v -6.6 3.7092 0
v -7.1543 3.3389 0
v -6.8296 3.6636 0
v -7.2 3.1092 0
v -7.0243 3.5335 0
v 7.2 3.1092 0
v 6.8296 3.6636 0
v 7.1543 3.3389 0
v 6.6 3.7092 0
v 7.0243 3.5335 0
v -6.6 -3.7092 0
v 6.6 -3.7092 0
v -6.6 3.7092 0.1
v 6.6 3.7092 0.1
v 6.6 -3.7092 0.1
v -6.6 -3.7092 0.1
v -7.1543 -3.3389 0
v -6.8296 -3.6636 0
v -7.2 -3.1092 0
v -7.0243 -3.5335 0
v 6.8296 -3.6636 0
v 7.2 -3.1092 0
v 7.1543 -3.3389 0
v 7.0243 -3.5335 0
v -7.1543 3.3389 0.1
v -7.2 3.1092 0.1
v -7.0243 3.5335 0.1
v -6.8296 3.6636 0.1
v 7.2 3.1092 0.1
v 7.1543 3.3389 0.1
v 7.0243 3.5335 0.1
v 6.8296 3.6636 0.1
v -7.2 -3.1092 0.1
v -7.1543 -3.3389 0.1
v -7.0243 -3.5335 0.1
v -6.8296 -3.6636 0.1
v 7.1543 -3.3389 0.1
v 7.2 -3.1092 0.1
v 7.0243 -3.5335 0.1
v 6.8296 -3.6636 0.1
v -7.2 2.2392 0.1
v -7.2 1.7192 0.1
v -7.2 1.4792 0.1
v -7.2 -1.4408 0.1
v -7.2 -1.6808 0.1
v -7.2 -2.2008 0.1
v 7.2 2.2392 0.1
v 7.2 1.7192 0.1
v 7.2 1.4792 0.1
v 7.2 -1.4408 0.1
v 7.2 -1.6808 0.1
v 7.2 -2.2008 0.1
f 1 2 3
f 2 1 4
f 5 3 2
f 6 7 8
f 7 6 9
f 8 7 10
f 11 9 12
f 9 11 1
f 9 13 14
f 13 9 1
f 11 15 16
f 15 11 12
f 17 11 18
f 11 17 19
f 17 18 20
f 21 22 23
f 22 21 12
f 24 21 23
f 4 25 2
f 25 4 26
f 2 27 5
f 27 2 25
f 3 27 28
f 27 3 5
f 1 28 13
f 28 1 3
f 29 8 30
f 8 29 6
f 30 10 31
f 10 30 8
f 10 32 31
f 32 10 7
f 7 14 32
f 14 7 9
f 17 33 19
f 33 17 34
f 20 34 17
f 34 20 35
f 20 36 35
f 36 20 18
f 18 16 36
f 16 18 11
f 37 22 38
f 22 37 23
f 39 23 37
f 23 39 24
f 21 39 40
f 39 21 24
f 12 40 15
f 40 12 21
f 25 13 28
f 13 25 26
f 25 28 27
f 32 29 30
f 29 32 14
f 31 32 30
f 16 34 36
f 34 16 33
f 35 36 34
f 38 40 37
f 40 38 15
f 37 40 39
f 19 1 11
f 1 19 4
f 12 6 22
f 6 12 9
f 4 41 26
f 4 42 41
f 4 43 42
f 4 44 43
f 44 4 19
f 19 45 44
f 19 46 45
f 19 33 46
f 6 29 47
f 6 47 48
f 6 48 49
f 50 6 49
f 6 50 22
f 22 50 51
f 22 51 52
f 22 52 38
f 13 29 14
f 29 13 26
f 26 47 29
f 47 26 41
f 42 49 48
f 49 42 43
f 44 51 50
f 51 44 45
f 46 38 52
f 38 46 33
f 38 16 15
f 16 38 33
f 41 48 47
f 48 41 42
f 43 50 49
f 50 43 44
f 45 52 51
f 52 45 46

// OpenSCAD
// file: ../p/box3u12.scad
use <../lib.scad>
function ldraw_lib__box3u12() = [
// 0 Box with 3 Parallel Faces without Any Edges
// 0 Name: box3u12.dat
// 0 Author: J.C. Tchang [tchang]
// 0 !LDRAW_ORG Primitive UPDATE 2014-02
// 0 !LICENSE Licensed under CC BY 4.0 : see CAreadme.txt
// 
// 0 BFC CERTIFY CCW
  [0,"BFC","CERTIFY"],
  [0,"BFC","CCW"],
// 
// 0 !HISTORY 2014-12-23 [PTadmin] Official Update 2014-02
// 
// 
// 4 16 -1 1 1 1 1 1 1 1 -1 -1 1 -1
  [4,16,-1,1,1,1,1,1,1,1,-1,-1,1,-1],
// 4 16 -1 1 1 -1 0 1 1 0 1 1 1 1
  [4,16,-1,1,1,-1,0,1,1,0,1,1,1,1],
// 4 16 1 1 -1 1 0 -1 -1 0 -1 -1 1 -1
  [4,16,1,1,-1,1,0,-1,-1,0,-1,-1,1,-1],
];
module ldraw_lib__box3u12(step=0, col=false, unit=2/5, alt=false, line=0.2, solid=!$preview)
    makepoly(ldraw_lib__box3u12(), step=step, col=col, unit=unit, alt=alt, line=line, solid=solid);
ldraw_lib__box3u12(line=0.2);
// file: ../p/1-4cyli.scad
use <../lib.scad>
function ldraw_lib__1_4cyli() = [
// 0 Cylinder 0.25
// 0 Name: 1-4cyli.dat
// 0 Author: James Jessiman
// 0 !LDRAW_ORG Primitive UPDATE 2012-01
// 0 !LICENSE Licensed under CC BY 4.0 : see CAreadme.txt
// 
// 0 BFC CERTIFY CCW
  [0,"BFC","CERTIFY"],
  [0,"BFC","CCW"],
// 
// 0 !HISTORY 2002-03-23 [sbliss] Added BFC statement.
// 0 !HISTORY 2002-04-25 [PTadmin] Official Update 2002-02
// 0 !HISTORY 2007-06-22 [PTadmin] Header formatted for Contributor Agreement
// 0 !HISTORY 2008-07-01 [PTadmin] Official Update 2008-01
// 0 !HISTORY 2012-02-16 [Philo] Changed to CCW
// 0 !HISTORY 2012-03-30 [PTadmin] Official Update 2012-01
// 
// 
// 4 16 1 1 0 0.9239 1 0.3827 0.9239 0 0.3827 1 0 0
  [4,16,1,1,0,0.9239,1,0.3827,0.9239,0,0.3827,1,0,0],
// 5 24 1 0 0 1 1 0 0.9239 0 0.3827 1 0 -1
  [5,24,1,0,0,1,1,0,0.9239,0,0.3827,1,0,-1],
// 4 16 0.9239 1 0.3827 0.7071 1 0.7071 0.7071 0 0.7071 0.9239 0 0.3827
  [4,16,0.9239,1,0.3827,0.7071,1,0.7071,0.7071,0,0.7071,0.9239,0,0.3827],
// 5 24 0.9239 0 0.3827 0.9239 1 0.3827 0.7071 0 0.7071 1 0 0
  [5,24,0.9239,0,0.3827,0.9239,1,0.3827,0.7071,0,0.7071,1,0,0],
// 4 16 0.7071 1 0.7071 0.3827 1 0.9239 0.3827 0 0.9239 0.7071 0 0.7071
  [4,16,0.7071,1,0.7071,0.3827,1,0.9239,0.3827,0,0.9239,0.7071,0,0.7071],
// 5 24 0.7071 0 0.7071 0.7071 1 0.7071 0.3827 0 0.9239 0.9239 0 0.3827
  [5,24,0.7071,0,0.7071,0.7071,1,0.7071,0.3827,0,0.9239,0.9239,0,0.3827],
// 4 16 0.3827 1 0.9239 0 1 1 0 0 1 0.3827 0 0.9239
  [4,16,0.3827,1,0.9239,0,1,1,0,0,1,0.3827,0,0.9239],
// 5 24 0.3827 0 0.9239 0.3827 1 0.9239 0 0 1 0.7071 0 0.7071
  [5,24,0.3827,0,0.9239,0.3827,1,0.9239,0,0,1,0.7071,0,0.7071],
// 5 24 0 0 1 0 1 1 0.3827 0 0.9239 -1 0 1
  [5,24,0,0,1,0,1,1,0.3827,0,0.9239,-1,0,1],
];
module ldraw_lib__1_4cyli(step=0, col=false, unit=2/5, alt=false, line=0.2, solid=!$preview)
    makepoly(ldraw_lib__1_4cyli(), step=step, col=col, unit=unit, alt=alt, line=line, solid=solid);
ldraw_lib__1_4cyli(line=0.2);
// file: ../p/1-4chrd.scad
use <../lib.scad>
function ldraw_lib__1_4chrd() = [
// 0 Chord 0.25
// 0 Name: 1-4chrd.dat
// 0 Author: Max Martin Richter [MMR1988]
// 0 !LDRAW_ORG Primitive UPDATE 2023-05
// 0 !LICENSE Licensed under CC BY 4.0 : see CAreadme.txt
// 
// 0 BFC CERTIFY CCW
  [0,"BFC","CERTIFY"],
  [0,"BFC","CCW"],
// 
// 0 !HISTORY 2004-04-22 [PTadmin] Official Update 2004-02
// 0 !HISTORY 2007-10-09 [PTadmin] Header formatted for Contributor Agreement
// 0 !HISTORY 2008-07-01 [PTadmin] Official Update 2008-01
// 0 !HISTORY 2012-08-02 [MMR1988] Re-creation with PrimGen2 and Rectifier
// 0 !HISTORY 2012-08-09 [PTadmin] Official Update 2012-02
// 0 !HISTORY 2023-10-27 [OrionP] Change author to MMR1988 from hafhead
// 0 !HISTORY 2023-10-31 [OrionP] Official Update 2023-05
// 
// 4 16 0.9239 0 0.3827 0.3827 0 0.9239 0 0 1 1 0 0
  [4,16,0.9239,0,0.3827,0.3827,0,0.9239,0,0,1,1,0,0],
// 3 16 0.7071 0 0.7071 0.3827 0 0.9239 0.9239 0 0.3827
  [3,16,0.7071,0,0.7071,0.3827,0,0.9239,0.9239,0,0.3827],
];
module ldraw_lib__1_4chrd(step=0, col=false, unit=2/5, alt=false, line=0.2, solid=!$preview)
    makepoly(ldraw_lib__1_4chrd(), step=step, col=col, unit=unit, alt=alt, line=line, solid=solid);
ldraw_lib__1_4chrd(line=0.2);
// main file
use <../lib.scad>
use <../p/1-4chrd.scad>
use <../p/1-4cyli.scad>
use <../p/box3u12.scad>
function ldraw_lib__6177969c() = [
// 0 Sticker  0.9 x  1.8 with Grey Stripes on Black Background
// 0 Name: 6177969c.dat
// 0 Author: Massimo Maso [Sirio]
// 0 !LDRAW_ORG Part UPDATE 2023-07
// 0 !LICENSE Licensed under CC BY 4.0 : see CAreadme.txt
// 
// 0 BFC CERTIFY CCW
  [0,"BFC","CERTIFY"],
  [0,"BFC","CCW"],
// 
// 0 !KEYWORDS 1966, Bricklink 75881stk01, Brickowl 507382, Ford, GT40
// 0 !KEYWORDS Rebrickable 30897, Set 75881, Speed Champions
// 
// 0 !HISTORY 2023-12-31 [OrionP] Official Update 2023-07
// 
// 
// 0 // Primitives
// 1 16 -16.5 0 7.7731 -1.5 0 0 0 -1 0 0 0 1.5 1-4chrd.dat
  [1,16,-16.5,0,7.7731,-1.5,0,0,0,-1,0,0,0,1.5, ldraw_lib__1_4chrd()],
// 1 16 16.5 0 7.7731 1.5 0 0 0 -1 0 0 0 1.5 1-4chrd.dat
  [1,16,16.5,0,7.7731,1.5,0,0,0,-1,0,0,0,1.5, ldraw_lib__1_4chrd()],
// 1 16 0 -.25 0 16.5 0 0 0 .25 0 0 0 9.2731 box3u12.dat
  [1,16,0,-.25,0,16.5,0,0,0,.25,0,0,0,9.2731, ldraw_lib__box3u12()],
// 1 16 -16.5 0 -7.7731 -1.5 0 0 0 -1 0 0 0 -1.5 1-4chrd.dat
  [1,16,-16.5,0,-7.7731,-1.5,0,0,0,-1,0,0,0,-1.5, ldraw_lib__1_4chrd()],
// 1 16 16.5 0 -7.7731 1.5 0 0 0 -1 0 0 0 -1.5 1-4chrd.dat
  [1,16,16.5,0,-7.7731,1.5,0,0,0,-1,0,0,0,-1.5, ldraw_lib__1_4chrd()],
// 1 16 -16.5 0 7.7731 -1.5 0 0 0 -.25 0 0 0 1.5 1-4cyli.dat
  [1,16,-16.5,0,7.7731,-1.5,0,0,0,-.25,0,0,0,1.5, ldraw_lib__1_4cyli()],
// 1 16 16.5 0 7.7731 1.5 0 0 0 -.25 0 0 0 1.5 1-4cyli.dat
  [1,16,16.5,0,7.7731,1.5,0,0,0,-.25,0,0,0,1.5, ldraw_lib__1_4cyli()],
// 1 16 -16.5 0 -7.7731 -1.5 0 0 0 -.25 0 0 0 -1.5 1-4cyli.dat
  [1,16,-16.5,0,-7.7731,-1.5,0,0,0,-.25,0,0,0,-1.5, ldraw_lib__1_4cyli()],
// 1 16 16.5 0 -7.7731 1.5 0 0 0 -.25 0 0 0 -1.5 1-4cyli.dat
  [1,16,16.5,0,-7.7731,1.5,0,0,0,-.25,0,0,0,-1.5, ldraw_lib__1_4cyli()],
// 1 0 -16.5 -.25 7.7731 -1.5 0 0 0 1 0 0 0 1.5 1-4chrd.dat
  [1,0,-16.5,-.25,7.7731,-1.5,0,0,0,1,0,0,0,1.5, ldraw_lib__1_4chrd()],
// 1 0 16.5 -.25 7.7731 1.5 0 0 0 1 0 0 0 1.5 1-4chrd.dat
  [1,0,16.5,-.25,7.7731,1.5,0,0,0,1,0,0,0,1.5, ldraw_lib__1_4chrd()],
// 1 0 -16.5 -.25 -7.7731 -1.5 0 0 0 1 0 0 0 -1.5 1-4chrd.dat
  [1,0,-16.5,-.25,-7.7731,-1.5,0,0,0,1,0,0,0,-1.5, ldraw_lib__1_4chrd()],
// 1 0 16.5 -.25 -7.7731 1.5 0 0 0 1 0 0 0 -1.5 1-4chrd.dat
  [1,0,16.5,-.25,-7.7731,1.5,0,0,0,1,0,0,0,-1.5, ldraw_lib__1_4chrd()],
// 0 // Bottom faces
// 4 16 -16.5 0 9.2731 -16.5 0 -9.2731 -18 0 -7.7731 -18 0 7.7731
  [4,16,-16.5,0,9.2731,-16.5,0,-9.2731,-18,0,-7.7731,-18,0,7.7731],
// 4 16 16.5 0 9.2731 18 0 7.7731 18 0 -7.7731 16.5 0 -9.2731
  [4,16,16.5,0,9.2731,18,0,7.7731,18,0,-7.7731,16.5,0,-9.2731],
// 0 // Lateral faces
// 3 16 -18 0 7.7731 -18 -.25 5.598 -18 -.25 7.7731
  [3,16,-18,0,7.7731,-18,-.25,5.598,-18,-.25,7.7731],
// 3 16 -18 0 7.7731 -18 -.25 4.298 -18 -.25 5.598
  [3,16,-18,0,7.7731,-18,-.25,4.298,-18,-.25,5.598],
// 3 16 -18 0 7.7731 -18 -.25 3.698 -18 -.25 4.298
  [3,16,-18,0,7.7731,-18,-.25,3.698,-18,-.25,4.298],
// 4 16 -18 0 7.7731 -18 0 -7.7731 -18 -.25 -3.602 -18 -.25 3.698
  [4,16,-18,0,7.7731,-18,0,-7.7731,-18,-.25,-3.602,-18,-.25,3.698],
// 3 16 -18 0 -7.7731 -18 -.25 -4.202 -18 -.25 -3.602
  [3,16,-18,0,-7.7731,-18,-.25,-4.202,-18,-.25,-3.602],
// 3 16 -18 0 -7.7731 -18 -.25 -5.502 -18 -.25 -4.202
  [3,16,-18,0,-7.7731,-18,-.25,-5.502,-18,-.25,-4.202],
// 3 16 -18 0 -7.7731 -18 -.25 -7.7731 -18 -.25 -5.502
  [3,16,-18,0,-7.7731,-18,-.25,-7.7731,-18,-.25,-5.502],
// 3 16 18 0 7.7731 18 -.25 7.7731 18 -.25 5.598
  [3,16,18,0,7.7731,18,-.25,7.7731,18,-.25,5.598],
// 3 16 18 0 7.7731 18 -.25 5.598 18 -.25 4.298
  [3,16,18,0,7.7731,18,-.25,5.598,18,-.25,4.298],
// 3 16 18 0 7.7731 18 -.25 4.298 18 -.25 3.698
  [3,16,18,0,7.7731,18,-.25,4.298,18,-.25,3.698],
// 4 16 18 0 7.7731 18 -.25 3.698 18 -.25 -3.602 18 0 -7.7731
  [4,16,18,0,7.7731,18,-.25,3.698,18,-.25,-3.602,18,0,-7.7731],
// 3 16 18 0 -7.7731 18 -.25 -3.602 18 -.25 -4.202
  [3,16,18,0,-7.7731,18,-.25,-3.602,18,-.25,-4.202],
// 3 16 18 0 -7.7731 18 -.25 -4.202 18 -.25 -5.502
  [3,16,18,0,-7.7731,18,-.25,-4.202,18,-.25,-5.502],
// 3 16 18 0 -7.7731 18 -.25 -5.502 18 -.25 -7.7731
  [3,16,18,0,-7.7731,18,-.25,-5.502,18,-.25,-7.7731],
// 0 // Top faces
// 0 // Black faces
// 4 0 -18 -.25 7.7731 18 -.25 7.7731 16.5 -.25 9.2731 -16.5 -.25 9.2731
  [4,0,-18,-.25,7.7731,18,-.25,7.7731,16.5,-.25,9.2731,-16.5,-.25,9.2731],
// 4 0 -18 -.25 7.7731 -18 -.25 5.598 18 -.25 5.598 18 -.25 7.7731
  [4,0,-18,-.25,7.7731,-18,-.25,5.598,18,-.25,5.598,18,-.25,7.7731],
// 4 0 -18 -.25 4.298 -18 -.25 3.698 18 -.25 3.698 18 -.25 4.298
  [4,0,-18,-.25,4.298,-18,-.25,3.698,18,-.25,3.698,18,-.25,4.298],
// 4 0 -18 -.25 -4.202 18 -.25 -4.202 18 -.25 -3.602 -18 -.25 -3.602
  [4,0,-18,-.25,-4.202,18,-.25,-4.202,18,-.25,-3.602,-18,-.25,-3.602],
// 4 0 -18 -.25 -7.7731 18 -.25 -7.7731 18 -.25 -5.502 -18 -.25 -5.502
  [4,0,-18,-.25,-7.7731,18,-.25,-7.7731,18,-.25,-5.502,-18,-.25,-5.502],
// 4 0 -18 -.25 -7.7731 -16.5 -.25 -9.2731 16.5 -.25 -9.2731 18 -.25 -7.7731
  [4,0,-18,-.25,-7.7731,-16.5,-.25,-9.2731,16.5,-.25,-9.2731,18,-.25,-7.7731],
// 0 // Grey faces
// 4 71 -18 -.25 4.298 18 -.25 4.298 18 -.25 5.598 -18 -.25 5.598
  [4,71,-18,-.25,4.298,18,-.25,4.298,18,-.25,5.598,-18,-.25,5.598],
// 4 71 -18 -.25 3.698 -18 -.25 -3.602 18 -.25 -3.602 18 -.25 3.698
  [4,71,-18,-.25,3.698,-18,-.25,-3.602,18,-.25,-3.602,18,-.25,3.698],
// 4 71 -18 -.25 -4.202 -18 -.25 -5.502 18 -.25 -5.502 18 -.25 -4.202
  [4,71,-18,-.25,-4.202,-18,-.25,-5.502,18,-.25,-5.502,18,-.25,-4.202],
];
module ldraw_lib__6177969c(step=0, col=false, unit=2/5, alt=false, line=0.2, solid=!$preview)
    makepoly(ldraw_lib__6177969c(), step=step, col=col, unit=unit, alt=alt, line=line, solid=solid);
ldraw_lib__6177969c(line=0.2);
